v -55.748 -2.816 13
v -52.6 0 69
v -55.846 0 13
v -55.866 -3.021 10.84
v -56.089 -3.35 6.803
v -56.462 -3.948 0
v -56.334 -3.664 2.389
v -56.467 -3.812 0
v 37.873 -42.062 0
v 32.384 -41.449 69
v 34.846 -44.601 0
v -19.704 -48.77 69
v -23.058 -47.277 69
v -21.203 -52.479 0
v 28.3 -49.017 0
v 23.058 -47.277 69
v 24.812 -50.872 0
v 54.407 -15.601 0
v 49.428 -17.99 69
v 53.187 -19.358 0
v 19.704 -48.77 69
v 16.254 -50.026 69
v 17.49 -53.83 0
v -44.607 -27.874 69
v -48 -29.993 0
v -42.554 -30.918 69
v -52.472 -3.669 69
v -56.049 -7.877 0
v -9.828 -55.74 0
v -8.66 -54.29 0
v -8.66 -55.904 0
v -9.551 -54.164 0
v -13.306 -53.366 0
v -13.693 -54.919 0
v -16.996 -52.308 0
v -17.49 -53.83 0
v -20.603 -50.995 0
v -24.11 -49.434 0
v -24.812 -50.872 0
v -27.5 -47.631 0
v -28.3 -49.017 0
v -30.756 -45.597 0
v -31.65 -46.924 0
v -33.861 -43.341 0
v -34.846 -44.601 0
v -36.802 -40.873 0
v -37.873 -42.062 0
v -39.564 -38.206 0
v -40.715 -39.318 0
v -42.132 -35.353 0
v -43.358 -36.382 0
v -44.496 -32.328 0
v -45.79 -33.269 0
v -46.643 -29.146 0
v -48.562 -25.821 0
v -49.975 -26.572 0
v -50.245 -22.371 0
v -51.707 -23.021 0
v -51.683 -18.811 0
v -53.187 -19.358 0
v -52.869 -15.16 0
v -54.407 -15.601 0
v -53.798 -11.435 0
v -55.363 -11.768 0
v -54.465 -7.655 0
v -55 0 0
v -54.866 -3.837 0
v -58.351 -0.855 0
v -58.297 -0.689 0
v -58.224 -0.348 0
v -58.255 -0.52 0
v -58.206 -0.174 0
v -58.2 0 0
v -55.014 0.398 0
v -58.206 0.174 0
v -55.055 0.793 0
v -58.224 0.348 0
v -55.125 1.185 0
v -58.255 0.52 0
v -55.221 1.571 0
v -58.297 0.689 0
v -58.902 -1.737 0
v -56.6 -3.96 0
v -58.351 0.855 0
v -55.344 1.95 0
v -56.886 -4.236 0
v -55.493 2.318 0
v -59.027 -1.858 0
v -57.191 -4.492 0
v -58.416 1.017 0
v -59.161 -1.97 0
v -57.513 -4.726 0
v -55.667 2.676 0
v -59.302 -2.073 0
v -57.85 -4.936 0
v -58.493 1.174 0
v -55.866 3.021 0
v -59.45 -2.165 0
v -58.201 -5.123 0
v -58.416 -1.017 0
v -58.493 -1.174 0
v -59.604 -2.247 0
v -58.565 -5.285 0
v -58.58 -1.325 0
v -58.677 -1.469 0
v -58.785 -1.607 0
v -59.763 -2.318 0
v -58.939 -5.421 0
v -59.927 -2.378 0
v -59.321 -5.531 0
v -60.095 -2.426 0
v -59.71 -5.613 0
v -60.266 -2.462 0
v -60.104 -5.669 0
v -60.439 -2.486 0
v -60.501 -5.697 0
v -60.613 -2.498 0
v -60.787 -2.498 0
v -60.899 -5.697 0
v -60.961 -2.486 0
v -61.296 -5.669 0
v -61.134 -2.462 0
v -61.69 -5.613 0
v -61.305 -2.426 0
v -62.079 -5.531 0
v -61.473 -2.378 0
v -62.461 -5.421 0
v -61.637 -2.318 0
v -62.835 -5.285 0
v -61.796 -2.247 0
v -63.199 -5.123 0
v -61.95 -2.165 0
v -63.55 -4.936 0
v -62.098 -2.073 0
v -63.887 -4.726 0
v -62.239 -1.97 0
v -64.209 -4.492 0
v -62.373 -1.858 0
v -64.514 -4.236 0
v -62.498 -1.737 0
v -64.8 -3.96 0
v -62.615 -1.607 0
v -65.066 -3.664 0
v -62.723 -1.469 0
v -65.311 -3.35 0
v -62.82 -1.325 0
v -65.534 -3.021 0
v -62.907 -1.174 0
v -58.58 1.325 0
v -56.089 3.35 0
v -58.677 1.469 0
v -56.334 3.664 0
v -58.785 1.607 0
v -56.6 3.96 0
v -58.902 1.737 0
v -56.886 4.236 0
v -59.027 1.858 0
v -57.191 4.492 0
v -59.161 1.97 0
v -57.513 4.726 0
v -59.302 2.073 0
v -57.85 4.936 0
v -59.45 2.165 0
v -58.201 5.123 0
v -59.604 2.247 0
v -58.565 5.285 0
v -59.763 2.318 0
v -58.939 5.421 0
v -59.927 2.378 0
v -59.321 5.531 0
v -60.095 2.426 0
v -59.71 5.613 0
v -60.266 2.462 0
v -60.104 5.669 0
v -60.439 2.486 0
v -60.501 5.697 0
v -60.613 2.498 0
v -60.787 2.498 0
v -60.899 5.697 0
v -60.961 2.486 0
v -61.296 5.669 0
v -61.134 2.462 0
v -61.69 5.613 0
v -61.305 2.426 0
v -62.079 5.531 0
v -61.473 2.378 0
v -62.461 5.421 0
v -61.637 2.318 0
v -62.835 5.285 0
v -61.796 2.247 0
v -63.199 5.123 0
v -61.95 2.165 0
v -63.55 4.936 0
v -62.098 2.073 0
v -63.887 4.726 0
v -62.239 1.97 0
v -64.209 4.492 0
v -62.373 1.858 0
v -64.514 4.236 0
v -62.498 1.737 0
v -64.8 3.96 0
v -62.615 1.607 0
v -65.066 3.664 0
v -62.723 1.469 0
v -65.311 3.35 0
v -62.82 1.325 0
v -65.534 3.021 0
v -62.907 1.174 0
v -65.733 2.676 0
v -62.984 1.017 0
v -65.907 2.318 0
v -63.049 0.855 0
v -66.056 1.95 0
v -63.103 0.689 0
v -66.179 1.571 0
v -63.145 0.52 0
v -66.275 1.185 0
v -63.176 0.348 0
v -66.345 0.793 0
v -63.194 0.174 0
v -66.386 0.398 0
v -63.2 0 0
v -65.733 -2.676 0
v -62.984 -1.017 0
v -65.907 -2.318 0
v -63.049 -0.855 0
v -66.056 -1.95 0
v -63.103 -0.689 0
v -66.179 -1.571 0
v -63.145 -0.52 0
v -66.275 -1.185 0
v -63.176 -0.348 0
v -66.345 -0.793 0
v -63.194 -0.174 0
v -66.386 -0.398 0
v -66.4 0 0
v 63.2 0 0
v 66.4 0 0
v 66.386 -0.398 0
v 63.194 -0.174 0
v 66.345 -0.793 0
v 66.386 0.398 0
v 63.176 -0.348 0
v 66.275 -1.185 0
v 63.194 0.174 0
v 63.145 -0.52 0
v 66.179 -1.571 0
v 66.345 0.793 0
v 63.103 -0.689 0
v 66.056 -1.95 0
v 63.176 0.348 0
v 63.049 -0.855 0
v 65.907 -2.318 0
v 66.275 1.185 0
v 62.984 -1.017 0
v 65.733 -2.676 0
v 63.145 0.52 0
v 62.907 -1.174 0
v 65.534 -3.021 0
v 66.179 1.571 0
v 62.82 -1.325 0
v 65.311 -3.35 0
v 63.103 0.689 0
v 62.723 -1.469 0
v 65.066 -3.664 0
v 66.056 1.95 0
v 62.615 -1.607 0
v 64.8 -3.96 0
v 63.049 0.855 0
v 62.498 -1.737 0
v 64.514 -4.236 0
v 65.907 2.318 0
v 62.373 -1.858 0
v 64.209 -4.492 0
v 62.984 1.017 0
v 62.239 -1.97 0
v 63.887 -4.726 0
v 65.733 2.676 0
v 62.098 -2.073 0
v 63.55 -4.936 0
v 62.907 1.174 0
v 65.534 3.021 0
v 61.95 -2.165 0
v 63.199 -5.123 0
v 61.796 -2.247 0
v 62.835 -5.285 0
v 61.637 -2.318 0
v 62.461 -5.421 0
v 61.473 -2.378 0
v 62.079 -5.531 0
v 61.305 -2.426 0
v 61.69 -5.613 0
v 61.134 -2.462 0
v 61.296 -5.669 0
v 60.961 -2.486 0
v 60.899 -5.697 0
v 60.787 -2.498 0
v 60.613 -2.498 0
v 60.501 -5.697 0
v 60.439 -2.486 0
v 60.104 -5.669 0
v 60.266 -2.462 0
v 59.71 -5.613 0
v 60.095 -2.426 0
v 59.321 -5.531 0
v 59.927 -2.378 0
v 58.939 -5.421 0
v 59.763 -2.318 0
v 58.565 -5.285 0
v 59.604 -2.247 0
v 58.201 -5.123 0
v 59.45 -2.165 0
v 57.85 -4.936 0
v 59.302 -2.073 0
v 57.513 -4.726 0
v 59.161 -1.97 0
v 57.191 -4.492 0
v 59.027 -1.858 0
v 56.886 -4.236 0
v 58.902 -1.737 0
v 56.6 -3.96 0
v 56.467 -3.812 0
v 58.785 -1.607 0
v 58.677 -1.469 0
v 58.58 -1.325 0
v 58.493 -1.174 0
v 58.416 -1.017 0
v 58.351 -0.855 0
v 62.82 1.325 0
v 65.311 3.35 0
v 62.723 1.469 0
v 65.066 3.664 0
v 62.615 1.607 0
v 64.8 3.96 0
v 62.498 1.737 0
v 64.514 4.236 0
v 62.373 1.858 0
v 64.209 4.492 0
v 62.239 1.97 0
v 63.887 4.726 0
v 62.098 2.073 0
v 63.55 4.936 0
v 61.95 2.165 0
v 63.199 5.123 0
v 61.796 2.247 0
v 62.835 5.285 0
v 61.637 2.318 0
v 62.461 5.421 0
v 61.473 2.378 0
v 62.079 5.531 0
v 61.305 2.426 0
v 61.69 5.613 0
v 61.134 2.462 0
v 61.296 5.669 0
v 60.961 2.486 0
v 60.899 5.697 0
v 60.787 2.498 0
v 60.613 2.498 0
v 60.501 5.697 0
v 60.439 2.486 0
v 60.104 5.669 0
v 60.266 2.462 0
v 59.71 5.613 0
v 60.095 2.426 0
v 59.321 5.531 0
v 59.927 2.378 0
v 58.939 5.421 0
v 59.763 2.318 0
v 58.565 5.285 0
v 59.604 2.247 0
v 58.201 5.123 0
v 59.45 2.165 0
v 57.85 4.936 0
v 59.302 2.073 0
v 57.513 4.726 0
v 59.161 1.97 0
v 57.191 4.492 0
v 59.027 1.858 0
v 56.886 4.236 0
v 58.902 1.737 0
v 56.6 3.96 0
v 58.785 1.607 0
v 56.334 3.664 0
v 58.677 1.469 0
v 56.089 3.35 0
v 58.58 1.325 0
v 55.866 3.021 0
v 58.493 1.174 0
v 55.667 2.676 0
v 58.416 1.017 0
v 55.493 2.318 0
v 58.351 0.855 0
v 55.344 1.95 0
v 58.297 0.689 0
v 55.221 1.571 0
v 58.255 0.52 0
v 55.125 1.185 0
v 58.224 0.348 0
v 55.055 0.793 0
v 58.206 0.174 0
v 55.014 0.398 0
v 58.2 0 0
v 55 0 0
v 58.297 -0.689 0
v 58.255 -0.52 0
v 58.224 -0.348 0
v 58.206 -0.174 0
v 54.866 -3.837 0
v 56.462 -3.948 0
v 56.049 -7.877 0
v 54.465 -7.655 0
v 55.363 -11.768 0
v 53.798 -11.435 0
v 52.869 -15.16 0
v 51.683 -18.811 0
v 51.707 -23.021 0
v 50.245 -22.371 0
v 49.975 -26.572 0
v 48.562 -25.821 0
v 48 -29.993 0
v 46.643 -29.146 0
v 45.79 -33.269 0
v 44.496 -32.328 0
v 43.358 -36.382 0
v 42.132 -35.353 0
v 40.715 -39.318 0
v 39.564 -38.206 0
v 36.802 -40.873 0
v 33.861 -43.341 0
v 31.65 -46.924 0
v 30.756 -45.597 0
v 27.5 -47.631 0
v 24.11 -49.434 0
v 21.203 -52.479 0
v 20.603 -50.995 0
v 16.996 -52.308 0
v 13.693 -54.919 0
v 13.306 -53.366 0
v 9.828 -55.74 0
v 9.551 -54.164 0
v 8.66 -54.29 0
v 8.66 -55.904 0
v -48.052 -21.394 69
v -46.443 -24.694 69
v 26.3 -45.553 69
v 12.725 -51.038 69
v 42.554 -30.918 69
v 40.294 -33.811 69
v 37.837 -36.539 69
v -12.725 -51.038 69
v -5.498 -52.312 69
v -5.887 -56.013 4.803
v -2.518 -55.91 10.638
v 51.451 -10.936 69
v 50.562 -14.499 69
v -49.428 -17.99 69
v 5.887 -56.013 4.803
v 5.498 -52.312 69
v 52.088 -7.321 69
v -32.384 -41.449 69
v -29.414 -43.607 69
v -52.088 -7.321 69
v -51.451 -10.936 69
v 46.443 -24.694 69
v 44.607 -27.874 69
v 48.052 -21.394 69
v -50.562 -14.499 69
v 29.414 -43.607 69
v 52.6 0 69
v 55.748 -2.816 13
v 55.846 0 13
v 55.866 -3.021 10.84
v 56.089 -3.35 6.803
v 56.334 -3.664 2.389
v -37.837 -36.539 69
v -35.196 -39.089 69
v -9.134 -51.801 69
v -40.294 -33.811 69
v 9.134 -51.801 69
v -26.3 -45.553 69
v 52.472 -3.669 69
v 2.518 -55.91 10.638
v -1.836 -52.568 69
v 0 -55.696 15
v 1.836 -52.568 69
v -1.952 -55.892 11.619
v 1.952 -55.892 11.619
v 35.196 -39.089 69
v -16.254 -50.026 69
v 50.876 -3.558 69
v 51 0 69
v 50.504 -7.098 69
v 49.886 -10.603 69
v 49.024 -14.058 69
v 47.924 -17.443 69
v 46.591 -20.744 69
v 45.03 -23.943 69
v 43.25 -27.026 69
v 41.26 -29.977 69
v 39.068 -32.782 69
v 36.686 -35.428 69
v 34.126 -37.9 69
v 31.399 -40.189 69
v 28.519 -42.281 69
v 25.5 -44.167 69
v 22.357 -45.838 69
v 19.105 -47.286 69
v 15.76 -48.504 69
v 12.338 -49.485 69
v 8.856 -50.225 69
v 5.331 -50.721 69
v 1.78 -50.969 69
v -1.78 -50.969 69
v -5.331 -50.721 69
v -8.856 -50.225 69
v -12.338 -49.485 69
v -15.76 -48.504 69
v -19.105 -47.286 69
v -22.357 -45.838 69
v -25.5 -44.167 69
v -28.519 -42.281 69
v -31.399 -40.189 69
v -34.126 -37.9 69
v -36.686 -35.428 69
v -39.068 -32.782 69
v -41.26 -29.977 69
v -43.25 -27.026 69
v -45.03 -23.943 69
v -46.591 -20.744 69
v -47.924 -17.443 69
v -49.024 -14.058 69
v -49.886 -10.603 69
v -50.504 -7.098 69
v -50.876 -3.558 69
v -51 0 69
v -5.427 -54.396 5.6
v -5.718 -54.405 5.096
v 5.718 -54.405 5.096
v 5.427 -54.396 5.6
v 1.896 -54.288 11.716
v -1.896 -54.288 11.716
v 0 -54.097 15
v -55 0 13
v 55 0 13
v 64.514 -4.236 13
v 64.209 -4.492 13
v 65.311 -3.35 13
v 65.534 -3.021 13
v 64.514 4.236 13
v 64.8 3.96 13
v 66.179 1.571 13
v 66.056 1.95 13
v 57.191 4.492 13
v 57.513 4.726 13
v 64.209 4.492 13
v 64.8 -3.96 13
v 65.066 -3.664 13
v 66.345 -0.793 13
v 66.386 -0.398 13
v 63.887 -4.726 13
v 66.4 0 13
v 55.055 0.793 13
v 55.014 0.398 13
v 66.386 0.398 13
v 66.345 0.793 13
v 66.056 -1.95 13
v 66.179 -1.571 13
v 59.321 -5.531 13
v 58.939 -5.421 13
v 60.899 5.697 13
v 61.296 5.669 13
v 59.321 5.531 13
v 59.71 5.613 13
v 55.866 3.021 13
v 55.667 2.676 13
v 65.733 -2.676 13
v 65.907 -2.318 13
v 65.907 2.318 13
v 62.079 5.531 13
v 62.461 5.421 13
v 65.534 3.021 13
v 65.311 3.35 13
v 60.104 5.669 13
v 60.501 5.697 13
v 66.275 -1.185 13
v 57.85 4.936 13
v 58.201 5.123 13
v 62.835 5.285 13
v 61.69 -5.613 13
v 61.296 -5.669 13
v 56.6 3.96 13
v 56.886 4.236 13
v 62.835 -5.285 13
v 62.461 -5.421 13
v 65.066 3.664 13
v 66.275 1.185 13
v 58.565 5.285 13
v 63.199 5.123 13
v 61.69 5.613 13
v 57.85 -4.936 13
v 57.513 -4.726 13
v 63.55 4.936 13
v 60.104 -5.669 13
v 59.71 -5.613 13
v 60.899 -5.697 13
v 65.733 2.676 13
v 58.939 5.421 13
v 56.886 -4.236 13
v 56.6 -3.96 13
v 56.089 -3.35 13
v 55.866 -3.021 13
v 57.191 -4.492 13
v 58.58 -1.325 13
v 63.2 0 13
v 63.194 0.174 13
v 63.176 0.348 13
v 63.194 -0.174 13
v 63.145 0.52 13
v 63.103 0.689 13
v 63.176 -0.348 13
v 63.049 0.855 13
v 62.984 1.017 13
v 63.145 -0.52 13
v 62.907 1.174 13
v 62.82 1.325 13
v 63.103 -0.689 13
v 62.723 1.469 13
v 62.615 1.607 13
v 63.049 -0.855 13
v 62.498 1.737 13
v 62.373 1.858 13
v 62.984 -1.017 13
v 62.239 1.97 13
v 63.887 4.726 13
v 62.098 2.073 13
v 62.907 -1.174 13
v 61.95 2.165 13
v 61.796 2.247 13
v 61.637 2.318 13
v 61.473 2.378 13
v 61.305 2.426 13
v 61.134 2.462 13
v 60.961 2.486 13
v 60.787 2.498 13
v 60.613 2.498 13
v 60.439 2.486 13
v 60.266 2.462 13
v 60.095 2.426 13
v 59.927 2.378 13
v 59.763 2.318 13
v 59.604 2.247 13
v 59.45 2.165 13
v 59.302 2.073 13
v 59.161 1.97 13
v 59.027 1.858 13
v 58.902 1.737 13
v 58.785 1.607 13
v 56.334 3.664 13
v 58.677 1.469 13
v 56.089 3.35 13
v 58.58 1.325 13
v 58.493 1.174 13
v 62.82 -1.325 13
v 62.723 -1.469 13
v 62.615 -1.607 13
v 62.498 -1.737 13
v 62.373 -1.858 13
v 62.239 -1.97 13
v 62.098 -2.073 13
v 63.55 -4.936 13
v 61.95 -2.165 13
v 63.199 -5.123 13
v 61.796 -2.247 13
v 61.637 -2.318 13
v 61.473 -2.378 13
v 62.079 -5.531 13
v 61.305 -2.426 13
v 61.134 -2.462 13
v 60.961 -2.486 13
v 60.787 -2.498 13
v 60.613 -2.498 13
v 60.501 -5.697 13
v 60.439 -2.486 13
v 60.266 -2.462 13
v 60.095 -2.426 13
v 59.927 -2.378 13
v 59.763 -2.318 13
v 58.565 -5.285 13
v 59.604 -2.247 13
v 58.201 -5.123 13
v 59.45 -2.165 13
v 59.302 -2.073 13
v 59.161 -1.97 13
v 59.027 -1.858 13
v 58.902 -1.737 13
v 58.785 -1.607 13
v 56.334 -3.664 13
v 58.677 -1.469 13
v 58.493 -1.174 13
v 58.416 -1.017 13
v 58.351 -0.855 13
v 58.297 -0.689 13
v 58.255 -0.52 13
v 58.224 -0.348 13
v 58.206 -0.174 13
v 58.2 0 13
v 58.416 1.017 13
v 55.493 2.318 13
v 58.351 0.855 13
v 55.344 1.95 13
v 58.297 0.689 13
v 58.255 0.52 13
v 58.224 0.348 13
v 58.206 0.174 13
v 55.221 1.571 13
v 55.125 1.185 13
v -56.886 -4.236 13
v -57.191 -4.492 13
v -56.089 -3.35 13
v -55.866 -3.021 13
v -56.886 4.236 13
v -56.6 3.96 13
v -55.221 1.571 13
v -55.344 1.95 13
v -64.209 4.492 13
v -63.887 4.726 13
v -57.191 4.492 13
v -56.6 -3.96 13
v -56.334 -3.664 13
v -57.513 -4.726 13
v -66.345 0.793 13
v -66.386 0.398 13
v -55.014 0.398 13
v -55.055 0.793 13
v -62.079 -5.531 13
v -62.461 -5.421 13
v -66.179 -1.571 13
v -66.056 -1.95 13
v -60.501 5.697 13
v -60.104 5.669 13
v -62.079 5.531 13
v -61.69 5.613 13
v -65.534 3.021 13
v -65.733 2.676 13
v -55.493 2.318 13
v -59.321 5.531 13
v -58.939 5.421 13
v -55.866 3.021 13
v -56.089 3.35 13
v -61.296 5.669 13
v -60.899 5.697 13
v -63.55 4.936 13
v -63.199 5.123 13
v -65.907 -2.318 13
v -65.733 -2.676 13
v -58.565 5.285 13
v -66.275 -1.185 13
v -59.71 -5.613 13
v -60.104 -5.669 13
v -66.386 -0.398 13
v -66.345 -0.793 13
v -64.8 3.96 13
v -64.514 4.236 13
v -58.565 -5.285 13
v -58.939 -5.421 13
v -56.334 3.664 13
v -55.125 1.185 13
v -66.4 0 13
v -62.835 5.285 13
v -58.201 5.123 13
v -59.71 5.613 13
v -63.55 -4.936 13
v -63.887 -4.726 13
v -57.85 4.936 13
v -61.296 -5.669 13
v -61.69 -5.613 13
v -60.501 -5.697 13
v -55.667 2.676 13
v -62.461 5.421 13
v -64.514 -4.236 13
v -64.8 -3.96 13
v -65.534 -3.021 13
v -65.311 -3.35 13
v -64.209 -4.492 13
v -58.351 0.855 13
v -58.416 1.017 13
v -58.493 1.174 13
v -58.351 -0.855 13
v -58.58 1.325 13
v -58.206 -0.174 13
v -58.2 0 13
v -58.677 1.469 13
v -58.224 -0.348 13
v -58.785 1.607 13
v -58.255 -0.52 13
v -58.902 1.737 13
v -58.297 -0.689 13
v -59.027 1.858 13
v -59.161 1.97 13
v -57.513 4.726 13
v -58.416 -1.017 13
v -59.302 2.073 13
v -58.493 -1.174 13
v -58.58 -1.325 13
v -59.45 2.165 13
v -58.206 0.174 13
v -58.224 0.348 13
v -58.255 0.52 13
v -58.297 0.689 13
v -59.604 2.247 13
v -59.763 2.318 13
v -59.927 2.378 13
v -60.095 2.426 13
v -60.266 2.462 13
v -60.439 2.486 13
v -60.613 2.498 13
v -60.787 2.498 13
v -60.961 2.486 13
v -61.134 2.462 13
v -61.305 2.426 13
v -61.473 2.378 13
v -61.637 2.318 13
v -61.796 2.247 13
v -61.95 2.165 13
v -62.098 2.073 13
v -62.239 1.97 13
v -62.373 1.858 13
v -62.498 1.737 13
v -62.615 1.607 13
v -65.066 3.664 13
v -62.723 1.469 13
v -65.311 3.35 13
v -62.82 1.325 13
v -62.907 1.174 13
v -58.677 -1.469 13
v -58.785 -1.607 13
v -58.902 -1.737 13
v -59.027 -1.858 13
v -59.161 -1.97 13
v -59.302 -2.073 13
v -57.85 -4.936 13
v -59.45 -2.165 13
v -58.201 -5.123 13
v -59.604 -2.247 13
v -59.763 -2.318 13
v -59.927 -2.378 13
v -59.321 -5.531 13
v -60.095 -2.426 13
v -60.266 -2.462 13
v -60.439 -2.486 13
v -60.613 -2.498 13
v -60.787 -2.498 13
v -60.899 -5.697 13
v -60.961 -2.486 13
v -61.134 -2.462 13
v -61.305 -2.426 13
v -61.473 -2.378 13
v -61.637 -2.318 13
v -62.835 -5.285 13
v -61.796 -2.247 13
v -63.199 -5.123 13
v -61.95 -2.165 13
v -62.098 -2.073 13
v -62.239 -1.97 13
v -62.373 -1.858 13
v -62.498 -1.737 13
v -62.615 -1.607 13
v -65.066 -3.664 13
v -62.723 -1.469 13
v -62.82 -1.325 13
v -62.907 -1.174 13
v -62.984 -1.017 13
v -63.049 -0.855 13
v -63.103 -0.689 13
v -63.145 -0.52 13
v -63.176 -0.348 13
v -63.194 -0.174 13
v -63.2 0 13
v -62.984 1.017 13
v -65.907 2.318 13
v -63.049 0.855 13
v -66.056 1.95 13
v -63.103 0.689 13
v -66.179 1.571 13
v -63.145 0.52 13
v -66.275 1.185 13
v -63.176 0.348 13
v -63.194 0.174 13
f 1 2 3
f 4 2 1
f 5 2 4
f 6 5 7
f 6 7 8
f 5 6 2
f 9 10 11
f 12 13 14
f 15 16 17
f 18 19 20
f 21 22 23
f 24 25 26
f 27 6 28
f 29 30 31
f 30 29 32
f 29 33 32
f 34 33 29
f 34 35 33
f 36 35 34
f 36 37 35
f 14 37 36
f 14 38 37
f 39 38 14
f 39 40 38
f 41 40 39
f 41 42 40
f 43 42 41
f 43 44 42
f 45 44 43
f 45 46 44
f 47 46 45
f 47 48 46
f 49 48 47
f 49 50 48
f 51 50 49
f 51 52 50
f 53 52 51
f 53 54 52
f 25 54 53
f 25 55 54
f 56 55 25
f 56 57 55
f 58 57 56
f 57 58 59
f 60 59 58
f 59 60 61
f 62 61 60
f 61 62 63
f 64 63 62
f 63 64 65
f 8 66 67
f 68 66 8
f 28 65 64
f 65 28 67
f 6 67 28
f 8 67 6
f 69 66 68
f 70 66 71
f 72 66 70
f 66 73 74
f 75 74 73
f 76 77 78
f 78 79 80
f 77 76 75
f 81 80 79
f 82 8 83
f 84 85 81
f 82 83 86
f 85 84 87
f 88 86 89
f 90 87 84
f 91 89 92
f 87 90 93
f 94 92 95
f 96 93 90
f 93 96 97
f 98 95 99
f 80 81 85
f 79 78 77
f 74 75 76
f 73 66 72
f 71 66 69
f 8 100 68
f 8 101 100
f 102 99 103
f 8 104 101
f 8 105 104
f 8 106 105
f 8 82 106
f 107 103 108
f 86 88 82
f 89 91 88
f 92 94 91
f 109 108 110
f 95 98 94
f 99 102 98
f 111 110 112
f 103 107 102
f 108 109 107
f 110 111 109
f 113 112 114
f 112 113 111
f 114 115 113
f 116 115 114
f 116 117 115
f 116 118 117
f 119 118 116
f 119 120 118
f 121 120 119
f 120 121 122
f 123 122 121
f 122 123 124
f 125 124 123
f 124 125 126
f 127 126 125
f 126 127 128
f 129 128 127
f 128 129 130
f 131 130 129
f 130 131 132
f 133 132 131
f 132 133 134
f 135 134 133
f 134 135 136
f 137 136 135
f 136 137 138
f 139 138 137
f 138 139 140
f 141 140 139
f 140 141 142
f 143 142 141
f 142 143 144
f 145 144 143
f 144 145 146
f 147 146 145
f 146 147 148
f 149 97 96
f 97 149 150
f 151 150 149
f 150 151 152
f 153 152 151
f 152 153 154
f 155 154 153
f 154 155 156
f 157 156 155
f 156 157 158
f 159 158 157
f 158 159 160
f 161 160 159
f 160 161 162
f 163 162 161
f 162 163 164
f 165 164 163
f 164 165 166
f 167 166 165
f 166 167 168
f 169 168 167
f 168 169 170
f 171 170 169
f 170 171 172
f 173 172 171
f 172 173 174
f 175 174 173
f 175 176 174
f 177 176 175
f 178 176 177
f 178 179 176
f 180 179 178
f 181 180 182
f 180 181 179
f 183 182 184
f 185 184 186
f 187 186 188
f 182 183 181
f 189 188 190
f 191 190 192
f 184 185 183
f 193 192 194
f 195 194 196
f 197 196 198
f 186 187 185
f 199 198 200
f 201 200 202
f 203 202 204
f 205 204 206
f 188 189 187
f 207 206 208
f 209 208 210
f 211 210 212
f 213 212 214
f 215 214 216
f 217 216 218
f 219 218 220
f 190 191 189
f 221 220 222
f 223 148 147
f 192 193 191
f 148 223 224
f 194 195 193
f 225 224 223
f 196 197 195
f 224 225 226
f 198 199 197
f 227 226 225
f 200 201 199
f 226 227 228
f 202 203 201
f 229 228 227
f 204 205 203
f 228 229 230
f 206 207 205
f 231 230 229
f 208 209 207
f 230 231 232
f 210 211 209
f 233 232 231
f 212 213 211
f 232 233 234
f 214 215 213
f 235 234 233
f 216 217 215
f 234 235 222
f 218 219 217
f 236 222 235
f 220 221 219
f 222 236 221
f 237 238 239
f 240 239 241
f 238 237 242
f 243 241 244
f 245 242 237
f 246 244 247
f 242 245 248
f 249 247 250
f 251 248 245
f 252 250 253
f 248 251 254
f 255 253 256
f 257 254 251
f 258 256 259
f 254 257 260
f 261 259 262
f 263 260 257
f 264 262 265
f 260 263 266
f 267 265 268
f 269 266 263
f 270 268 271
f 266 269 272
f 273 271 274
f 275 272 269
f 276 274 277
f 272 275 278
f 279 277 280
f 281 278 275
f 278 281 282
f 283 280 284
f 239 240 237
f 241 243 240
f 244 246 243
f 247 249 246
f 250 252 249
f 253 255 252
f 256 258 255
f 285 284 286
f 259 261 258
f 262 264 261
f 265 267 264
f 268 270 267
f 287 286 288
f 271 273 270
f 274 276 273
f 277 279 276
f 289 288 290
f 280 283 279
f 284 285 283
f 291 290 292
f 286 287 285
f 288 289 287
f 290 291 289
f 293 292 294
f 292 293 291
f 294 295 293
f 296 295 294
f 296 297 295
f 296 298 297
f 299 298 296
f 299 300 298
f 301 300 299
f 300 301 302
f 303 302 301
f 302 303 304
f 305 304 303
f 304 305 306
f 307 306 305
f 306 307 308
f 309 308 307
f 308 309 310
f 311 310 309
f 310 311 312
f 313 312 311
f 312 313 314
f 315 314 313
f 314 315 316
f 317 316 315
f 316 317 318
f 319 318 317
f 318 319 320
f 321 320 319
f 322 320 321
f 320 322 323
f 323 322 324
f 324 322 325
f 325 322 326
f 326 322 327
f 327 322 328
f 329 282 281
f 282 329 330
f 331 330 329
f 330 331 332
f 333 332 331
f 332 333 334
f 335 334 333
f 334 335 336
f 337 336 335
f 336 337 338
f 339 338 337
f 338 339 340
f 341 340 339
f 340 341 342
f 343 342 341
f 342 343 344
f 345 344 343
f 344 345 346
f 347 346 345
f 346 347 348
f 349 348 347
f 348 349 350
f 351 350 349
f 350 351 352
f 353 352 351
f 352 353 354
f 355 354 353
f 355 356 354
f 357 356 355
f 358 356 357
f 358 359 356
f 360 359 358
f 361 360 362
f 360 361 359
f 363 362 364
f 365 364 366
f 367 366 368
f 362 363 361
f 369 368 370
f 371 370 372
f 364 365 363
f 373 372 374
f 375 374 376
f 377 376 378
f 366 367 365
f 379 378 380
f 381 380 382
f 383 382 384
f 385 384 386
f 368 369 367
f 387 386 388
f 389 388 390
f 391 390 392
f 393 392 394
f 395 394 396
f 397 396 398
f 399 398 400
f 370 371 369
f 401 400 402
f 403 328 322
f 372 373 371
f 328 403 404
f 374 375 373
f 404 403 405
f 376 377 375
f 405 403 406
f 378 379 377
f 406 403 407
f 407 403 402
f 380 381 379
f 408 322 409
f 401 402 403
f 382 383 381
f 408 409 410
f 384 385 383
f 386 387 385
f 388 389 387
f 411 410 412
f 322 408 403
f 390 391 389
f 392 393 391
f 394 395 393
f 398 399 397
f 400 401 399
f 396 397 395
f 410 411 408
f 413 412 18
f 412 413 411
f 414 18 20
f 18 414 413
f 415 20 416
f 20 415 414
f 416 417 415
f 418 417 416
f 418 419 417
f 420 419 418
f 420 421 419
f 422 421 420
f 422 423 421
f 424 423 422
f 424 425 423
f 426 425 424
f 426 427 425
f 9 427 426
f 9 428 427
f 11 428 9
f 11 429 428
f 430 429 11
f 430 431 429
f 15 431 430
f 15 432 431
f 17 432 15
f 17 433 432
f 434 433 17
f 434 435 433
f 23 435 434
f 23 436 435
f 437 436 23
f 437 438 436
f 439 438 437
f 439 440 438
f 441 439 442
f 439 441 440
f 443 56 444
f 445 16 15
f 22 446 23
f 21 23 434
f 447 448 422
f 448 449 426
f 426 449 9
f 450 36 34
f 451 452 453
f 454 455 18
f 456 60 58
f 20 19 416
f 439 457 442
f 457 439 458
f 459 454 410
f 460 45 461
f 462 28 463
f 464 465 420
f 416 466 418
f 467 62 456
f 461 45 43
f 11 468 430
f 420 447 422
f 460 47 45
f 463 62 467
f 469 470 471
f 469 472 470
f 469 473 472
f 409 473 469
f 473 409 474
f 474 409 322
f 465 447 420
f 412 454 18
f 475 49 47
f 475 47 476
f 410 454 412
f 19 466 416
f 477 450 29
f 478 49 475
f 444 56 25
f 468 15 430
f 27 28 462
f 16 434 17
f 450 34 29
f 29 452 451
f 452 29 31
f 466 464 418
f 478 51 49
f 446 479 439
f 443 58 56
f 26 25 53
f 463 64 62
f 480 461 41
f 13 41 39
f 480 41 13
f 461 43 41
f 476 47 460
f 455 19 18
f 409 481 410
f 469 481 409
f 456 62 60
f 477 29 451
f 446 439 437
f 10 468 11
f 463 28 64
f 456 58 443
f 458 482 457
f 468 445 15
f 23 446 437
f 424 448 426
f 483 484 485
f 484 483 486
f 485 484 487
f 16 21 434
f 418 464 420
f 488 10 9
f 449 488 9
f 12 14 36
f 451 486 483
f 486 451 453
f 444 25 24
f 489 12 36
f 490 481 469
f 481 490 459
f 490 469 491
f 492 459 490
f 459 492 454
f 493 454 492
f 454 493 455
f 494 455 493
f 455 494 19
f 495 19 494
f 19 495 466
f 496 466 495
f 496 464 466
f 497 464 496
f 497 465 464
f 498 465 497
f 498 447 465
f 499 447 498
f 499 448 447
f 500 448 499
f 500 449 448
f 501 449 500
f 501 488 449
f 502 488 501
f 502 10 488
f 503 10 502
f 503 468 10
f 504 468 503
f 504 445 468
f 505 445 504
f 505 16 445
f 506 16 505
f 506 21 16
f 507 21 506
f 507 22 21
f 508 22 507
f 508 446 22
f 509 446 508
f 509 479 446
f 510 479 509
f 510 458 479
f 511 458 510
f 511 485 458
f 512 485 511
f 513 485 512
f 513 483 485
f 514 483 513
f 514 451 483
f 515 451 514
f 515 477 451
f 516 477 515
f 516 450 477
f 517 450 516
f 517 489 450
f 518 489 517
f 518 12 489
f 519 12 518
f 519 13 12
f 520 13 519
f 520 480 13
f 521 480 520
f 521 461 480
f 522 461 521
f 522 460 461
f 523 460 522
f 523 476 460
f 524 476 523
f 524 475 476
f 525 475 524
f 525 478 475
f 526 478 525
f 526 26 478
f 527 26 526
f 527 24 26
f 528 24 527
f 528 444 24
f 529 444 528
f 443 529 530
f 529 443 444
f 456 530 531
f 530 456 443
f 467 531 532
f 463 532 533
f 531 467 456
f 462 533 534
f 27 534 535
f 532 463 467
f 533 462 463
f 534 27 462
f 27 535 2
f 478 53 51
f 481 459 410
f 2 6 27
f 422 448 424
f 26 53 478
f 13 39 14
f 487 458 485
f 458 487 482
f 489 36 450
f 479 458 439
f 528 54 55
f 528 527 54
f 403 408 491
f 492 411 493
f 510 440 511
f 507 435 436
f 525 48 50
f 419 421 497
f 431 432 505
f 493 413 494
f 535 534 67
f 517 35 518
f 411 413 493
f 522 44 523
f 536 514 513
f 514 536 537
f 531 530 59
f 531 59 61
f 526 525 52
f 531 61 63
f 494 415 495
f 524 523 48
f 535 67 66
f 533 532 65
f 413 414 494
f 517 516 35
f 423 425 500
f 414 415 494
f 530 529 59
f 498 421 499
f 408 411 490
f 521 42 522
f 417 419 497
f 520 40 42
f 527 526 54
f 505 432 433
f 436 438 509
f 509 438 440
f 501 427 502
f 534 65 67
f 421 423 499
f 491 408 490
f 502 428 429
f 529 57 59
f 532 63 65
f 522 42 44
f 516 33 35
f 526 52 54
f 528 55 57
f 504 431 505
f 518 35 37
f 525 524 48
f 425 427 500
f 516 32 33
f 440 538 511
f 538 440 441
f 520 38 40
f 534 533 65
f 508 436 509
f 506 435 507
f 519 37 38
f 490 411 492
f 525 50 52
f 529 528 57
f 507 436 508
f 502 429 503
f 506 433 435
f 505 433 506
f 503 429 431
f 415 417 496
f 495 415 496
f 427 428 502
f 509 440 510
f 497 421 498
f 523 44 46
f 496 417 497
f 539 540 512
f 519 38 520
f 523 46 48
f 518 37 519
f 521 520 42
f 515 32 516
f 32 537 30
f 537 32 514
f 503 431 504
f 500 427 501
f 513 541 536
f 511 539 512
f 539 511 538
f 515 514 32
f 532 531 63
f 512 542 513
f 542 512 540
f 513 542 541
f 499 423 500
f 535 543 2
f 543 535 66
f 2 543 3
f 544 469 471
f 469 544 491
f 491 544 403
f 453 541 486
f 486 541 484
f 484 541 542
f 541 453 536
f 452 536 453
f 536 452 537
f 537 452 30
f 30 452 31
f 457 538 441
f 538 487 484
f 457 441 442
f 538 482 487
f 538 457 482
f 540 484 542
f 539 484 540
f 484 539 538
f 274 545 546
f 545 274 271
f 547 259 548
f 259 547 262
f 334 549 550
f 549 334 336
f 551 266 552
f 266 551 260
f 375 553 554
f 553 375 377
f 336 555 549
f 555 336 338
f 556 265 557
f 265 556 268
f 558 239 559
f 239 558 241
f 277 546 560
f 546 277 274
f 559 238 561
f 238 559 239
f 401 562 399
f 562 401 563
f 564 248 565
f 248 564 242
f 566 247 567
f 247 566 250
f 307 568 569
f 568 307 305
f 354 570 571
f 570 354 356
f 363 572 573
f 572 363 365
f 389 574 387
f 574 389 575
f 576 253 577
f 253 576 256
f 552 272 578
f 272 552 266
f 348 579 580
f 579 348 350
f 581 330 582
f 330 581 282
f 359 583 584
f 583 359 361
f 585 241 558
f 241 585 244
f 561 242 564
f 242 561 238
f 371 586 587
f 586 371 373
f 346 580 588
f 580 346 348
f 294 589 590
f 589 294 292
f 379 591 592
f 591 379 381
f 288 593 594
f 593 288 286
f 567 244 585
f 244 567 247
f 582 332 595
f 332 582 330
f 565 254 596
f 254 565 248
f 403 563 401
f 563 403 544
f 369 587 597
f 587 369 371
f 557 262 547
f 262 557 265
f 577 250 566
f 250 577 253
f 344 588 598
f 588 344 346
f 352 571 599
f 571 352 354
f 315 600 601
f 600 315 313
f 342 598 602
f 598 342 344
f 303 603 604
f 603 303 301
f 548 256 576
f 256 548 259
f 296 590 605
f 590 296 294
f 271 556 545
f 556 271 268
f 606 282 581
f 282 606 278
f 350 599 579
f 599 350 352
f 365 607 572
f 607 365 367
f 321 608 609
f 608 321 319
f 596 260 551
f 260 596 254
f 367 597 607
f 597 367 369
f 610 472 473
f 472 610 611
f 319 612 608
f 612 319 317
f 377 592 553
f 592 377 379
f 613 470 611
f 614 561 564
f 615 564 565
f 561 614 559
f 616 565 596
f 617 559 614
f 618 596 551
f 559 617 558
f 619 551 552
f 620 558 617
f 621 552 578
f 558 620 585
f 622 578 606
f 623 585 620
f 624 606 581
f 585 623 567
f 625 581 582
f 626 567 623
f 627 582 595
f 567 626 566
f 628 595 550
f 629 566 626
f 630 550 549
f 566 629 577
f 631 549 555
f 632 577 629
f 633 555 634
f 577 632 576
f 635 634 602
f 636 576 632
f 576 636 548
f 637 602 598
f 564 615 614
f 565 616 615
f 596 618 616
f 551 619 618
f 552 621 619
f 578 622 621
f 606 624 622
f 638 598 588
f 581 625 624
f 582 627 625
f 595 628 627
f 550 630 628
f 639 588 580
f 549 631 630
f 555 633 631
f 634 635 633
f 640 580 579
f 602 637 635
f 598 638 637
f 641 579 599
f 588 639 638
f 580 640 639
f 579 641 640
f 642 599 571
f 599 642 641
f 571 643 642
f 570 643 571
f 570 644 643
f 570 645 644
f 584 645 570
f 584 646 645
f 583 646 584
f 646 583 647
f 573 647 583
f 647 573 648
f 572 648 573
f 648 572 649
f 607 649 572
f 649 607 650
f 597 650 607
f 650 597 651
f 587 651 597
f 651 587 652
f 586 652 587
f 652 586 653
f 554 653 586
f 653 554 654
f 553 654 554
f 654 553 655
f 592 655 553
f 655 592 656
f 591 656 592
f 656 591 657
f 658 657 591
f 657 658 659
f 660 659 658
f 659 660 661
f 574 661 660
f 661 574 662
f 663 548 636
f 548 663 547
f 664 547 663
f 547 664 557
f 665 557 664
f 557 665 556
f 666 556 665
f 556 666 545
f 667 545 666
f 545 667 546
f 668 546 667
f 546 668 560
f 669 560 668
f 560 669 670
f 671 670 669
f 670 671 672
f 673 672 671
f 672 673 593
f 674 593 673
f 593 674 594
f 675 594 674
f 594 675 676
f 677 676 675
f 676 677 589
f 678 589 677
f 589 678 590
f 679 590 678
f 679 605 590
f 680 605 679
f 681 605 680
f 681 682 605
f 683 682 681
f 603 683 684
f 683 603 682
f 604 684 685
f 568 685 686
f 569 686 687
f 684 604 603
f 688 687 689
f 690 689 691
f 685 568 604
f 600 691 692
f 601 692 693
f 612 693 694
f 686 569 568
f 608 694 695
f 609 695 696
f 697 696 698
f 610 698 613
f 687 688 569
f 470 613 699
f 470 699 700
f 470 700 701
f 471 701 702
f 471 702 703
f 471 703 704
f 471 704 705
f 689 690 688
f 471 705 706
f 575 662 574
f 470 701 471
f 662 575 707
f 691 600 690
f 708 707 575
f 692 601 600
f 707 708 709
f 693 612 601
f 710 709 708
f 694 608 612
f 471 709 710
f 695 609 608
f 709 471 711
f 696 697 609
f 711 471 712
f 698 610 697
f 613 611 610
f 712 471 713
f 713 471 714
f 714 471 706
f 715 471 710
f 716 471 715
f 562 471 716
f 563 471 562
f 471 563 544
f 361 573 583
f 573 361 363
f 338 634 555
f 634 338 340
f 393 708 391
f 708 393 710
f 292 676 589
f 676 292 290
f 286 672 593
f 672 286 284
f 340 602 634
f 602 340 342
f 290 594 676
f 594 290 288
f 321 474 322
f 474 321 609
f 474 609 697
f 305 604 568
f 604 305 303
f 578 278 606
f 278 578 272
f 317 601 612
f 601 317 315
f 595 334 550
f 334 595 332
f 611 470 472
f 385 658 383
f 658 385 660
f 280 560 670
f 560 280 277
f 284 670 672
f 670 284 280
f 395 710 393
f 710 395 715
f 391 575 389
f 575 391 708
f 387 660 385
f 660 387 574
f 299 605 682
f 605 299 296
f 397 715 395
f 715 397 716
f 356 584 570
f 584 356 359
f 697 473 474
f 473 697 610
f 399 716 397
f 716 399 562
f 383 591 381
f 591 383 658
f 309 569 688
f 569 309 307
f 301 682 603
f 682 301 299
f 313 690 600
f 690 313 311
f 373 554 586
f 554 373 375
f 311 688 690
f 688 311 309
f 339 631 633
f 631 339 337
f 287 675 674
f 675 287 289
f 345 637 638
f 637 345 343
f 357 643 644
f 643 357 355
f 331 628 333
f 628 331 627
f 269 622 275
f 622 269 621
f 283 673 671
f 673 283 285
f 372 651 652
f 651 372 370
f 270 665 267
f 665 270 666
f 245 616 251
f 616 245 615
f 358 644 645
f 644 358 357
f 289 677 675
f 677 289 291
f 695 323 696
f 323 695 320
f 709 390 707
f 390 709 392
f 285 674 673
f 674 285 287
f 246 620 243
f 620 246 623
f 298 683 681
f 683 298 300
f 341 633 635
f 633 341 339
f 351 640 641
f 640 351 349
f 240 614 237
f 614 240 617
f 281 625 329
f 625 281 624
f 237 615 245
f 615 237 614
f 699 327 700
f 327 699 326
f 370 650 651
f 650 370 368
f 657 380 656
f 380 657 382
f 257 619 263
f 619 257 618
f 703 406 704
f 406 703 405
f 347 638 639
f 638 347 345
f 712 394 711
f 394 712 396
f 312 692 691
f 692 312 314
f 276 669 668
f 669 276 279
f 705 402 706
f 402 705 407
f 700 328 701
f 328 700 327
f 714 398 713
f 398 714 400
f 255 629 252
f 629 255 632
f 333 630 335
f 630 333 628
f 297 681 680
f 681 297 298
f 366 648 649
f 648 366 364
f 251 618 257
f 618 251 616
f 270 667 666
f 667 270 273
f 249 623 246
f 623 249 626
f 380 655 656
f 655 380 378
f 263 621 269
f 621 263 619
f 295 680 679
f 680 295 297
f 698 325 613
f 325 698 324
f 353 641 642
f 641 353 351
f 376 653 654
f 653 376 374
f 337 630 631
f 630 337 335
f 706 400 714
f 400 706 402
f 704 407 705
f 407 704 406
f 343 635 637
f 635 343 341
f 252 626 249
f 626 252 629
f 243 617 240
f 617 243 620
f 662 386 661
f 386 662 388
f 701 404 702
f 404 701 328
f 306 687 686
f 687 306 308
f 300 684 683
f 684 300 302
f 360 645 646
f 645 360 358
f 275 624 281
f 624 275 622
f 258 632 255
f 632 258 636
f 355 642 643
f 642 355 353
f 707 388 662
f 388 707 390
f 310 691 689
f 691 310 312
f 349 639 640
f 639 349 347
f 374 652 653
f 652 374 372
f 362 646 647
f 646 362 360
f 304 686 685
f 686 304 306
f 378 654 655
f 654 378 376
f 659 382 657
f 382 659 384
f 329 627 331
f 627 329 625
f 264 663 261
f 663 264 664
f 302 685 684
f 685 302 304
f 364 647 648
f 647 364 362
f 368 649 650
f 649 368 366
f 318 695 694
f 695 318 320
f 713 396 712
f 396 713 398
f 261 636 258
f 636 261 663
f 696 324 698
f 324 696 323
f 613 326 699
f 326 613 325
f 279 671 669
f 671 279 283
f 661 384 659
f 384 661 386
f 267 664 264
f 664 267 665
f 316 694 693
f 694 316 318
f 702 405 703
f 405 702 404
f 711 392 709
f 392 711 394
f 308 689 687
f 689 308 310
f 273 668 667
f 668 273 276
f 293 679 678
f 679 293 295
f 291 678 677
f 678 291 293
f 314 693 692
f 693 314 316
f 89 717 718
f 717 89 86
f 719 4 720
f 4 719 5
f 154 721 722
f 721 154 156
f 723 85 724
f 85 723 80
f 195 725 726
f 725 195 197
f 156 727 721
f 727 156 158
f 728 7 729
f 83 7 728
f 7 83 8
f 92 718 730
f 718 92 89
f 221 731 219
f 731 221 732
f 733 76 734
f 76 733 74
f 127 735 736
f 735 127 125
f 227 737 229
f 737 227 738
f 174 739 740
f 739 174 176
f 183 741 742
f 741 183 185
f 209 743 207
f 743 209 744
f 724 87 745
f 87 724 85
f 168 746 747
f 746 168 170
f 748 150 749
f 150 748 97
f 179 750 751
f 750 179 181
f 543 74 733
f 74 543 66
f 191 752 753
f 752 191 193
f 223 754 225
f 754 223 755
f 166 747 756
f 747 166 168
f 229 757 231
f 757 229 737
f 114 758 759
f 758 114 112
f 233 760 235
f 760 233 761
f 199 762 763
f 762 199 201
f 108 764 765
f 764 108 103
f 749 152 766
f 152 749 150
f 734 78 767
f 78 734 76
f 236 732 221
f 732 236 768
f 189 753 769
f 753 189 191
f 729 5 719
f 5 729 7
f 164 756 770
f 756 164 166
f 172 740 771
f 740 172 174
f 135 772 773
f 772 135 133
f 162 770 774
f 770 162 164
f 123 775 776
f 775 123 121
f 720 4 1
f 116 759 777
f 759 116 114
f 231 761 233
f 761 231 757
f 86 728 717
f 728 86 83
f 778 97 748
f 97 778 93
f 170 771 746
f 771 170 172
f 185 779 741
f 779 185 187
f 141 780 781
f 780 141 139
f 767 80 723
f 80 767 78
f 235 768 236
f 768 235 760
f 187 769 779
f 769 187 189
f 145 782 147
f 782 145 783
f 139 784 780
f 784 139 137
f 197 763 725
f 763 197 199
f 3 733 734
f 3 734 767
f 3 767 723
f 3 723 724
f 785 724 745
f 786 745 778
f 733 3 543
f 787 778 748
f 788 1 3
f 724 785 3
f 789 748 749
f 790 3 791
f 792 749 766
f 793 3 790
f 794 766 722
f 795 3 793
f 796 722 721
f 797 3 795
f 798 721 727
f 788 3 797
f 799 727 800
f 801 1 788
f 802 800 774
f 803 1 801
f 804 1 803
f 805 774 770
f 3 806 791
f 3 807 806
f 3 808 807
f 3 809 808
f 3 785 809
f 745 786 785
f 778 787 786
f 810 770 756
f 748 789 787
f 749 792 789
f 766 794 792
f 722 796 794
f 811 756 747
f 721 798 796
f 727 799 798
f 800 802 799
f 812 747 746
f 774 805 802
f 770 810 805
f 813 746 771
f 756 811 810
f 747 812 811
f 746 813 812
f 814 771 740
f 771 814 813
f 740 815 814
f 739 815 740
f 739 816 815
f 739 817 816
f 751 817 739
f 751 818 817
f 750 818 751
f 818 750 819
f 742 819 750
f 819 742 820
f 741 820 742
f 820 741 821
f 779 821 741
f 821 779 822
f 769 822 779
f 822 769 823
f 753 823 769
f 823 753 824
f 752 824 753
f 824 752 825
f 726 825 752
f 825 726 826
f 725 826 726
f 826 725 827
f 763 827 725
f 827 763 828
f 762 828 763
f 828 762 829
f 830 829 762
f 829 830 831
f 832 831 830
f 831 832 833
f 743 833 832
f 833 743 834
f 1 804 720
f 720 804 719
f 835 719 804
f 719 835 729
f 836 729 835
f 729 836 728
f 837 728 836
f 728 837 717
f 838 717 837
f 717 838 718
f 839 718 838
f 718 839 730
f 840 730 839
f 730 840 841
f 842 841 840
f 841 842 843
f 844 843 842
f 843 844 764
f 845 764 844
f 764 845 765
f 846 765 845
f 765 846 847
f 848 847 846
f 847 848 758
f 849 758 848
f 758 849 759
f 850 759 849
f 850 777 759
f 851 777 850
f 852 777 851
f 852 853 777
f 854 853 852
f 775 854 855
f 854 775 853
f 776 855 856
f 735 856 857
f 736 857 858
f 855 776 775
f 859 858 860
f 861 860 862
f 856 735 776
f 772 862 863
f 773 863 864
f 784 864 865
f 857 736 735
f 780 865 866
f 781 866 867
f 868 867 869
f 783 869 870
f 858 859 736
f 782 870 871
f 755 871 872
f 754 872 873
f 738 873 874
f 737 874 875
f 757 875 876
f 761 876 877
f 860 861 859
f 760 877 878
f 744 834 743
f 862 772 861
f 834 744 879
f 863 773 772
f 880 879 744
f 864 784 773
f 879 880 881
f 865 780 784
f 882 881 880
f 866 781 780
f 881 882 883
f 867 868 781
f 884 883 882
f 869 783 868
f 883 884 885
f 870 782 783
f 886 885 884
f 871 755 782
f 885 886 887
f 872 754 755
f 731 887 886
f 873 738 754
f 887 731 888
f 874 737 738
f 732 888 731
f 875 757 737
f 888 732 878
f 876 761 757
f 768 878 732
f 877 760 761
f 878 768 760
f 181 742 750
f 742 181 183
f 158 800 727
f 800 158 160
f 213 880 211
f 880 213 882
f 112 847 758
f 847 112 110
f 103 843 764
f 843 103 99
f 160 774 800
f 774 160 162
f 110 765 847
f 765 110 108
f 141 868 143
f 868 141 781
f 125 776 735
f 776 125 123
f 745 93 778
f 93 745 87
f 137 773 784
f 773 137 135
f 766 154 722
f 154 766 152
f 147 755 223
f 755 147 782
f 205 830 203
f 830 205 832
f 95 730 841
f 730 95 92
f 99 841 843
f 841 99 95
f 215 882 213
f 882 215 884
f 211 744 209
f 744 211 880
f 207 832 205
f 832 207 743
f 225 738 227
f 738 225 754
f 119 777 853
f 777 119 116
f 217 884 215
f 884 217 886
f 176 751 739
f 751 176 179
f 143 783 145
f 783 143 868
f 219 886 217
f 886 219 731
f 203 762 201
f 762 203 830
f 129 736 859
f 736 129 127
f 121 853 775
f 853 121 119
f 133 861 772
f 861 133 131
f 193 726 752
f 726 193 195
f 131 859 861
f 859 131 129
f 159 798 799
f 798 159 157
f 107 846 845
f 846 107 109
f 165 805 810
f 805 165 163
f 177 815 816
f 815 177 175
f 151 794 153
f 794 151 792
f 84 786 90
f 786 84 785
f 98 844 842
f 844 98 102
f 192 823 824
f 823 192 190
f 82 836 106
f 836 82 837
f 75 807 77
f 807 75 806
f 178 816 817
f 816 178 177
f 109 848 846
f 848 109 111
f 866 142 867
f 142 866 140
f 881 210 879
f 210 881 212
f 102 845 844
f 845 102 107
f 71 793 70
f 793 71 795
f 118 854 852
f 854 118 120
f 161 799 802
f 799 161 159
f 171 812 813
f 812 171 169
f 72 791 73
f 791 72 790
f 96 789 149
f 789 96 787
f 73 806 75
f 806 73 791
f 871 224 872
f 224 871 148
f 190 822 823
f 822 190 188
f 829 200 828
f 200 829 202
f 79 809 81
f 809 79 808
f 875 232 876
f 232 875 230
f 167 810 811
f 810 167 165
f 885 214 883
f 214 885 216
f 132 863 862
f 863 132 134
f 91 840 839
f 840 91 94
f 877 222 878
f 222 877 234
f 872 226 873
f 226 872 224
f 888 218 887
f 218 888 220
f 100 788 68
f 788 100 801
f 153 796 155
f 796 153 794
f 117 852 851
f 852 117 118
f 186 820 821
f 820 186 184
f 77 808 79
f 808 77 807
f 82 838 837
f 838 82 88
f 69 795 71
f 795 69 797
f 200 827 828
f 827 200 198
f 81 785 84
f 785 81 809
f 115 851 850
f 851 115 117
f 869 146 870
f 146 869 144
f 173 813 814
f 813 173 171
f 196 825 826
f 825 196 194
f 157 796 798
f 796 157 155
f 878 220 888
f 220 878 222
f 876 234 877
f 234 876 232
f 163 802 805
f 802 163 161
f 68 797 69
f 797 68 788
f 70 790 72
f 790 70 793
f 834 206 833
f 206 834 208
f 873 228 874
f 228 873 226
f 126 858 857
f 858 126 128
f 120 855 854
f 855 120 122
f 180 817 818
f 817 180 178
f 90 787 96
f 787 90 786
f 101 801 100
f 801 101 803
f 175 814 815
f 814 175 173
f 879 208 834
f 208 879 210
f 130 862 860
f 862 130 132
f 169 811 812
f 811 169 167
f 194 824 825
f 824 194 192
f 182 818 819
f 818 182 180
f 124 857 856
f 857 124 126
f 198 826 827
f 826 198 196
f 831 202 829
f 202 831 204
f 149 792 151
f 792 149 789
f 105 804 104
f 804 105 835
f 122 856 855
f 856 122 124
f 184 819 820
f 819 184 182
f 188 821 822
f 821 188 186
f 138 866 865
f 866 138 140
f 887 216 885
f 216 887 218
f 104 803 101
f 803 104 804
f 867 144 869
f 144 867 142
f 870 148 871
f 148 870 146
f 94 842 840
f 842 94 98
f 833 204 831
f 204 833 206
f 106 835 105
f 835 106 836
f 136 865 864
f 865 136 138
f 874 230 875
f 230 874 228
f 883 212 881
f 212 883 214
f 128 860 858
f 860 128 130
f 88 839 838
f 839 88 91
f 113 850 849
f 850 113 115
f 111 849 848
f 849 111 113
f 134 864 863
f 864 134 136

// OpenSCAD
$fn=90;

d1=110;
d2=102;
h=69;

nozzleD=0.4;
wallCount=4;
wallThickness=wallCount*nozzleD;

wallD1=d1+wallThickness*2;
wallD2=d2+wallThickness*2;

holder();

module holder() {
    difference() {
        cylinder(d1=wallD1, d2=wallD2, h=h);
        cylinder(d1=d1, d2=d2, h=h);
        translate([-wallD2,0,0]) cube([2*wallD2,2*wallD2,h*2]);
        rotate([90,30,0]) cylinder($fn=3,d=30,h=2*d2);
    }

    screwD=5;
    screwD2=screwD+nozzleD*2*8;
    screwH=13;
    translate([d1/2+screwD2/2,0,0]) screwHole(screwD,screwD2,screwH);
    translate([-d1/2-screwD2/2,0,0]) screwHole(screwD,screwD2,screwH);
}

module screwHole(d=5,dOutside=8,h=10) {
    difference() {
        cylinder(d=dOutside,h=h);
        cylinder(d=d,h=h);
    }
}
